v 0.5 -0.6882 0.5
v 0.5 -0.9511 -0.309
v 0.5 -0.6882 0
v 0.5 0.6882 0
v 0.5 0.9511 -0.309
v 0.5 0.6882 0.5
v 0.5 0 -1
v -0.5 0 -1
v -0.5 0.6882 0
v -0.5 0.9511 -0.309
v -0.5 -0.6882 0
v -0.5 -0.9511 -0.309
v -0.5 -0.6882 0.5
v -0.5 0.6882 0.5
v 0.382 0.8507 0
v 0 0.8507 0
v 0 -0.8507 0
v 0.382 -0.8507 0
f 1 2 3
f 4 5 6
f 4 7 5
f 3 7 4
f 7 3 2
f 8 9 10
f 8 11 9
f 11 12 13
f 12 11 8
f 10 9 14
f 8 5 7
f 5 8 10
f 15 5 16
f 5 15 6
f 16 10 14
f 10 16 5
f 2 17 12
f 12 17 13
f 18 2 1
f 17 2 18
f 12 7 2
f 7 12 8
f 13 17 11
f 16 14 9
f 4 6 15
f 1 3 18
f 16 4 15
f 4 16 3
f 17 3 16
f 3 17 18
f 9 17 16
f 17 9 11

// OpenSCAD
cube_size = "10"; // [10:Small,20:Medium,30:Large]

hole_diameter = "2.5"; 
hole_radius = hole_diameter/2;

// How deep should the center hole be?
hole_depth = "1"; // [0,1,5,50]

show_wheels = "yes"; // [yes,no]

// How thick should the side wheels be?
wheel_thickness = "1"; // [1:40]

// ignore this variable!
// foo=1;

// don't turn functions into params!
function BEZ03(u) = pow((1-u), 3);

// ignore variable values
bing = 3+4;
baz = 3 / hole_depth;

difference() {
  union() {
    translate([0, 0, cube_size/2]) cube([cube_size,cube_size,cube_size], center=true);
    if (show_wheels == "yes") {
      translate([0, 0, cube_size/2]) rotate([0, 90, 0]) {
        cylinder(r=cube_size/2, h=cube_size+(wheel_thickness*2), center=true);
      }
    }
  }
  translate([0, 0, cube_size-hole_depth]) cylinder(r=hole_radius, h=hole_depth);
}
        
